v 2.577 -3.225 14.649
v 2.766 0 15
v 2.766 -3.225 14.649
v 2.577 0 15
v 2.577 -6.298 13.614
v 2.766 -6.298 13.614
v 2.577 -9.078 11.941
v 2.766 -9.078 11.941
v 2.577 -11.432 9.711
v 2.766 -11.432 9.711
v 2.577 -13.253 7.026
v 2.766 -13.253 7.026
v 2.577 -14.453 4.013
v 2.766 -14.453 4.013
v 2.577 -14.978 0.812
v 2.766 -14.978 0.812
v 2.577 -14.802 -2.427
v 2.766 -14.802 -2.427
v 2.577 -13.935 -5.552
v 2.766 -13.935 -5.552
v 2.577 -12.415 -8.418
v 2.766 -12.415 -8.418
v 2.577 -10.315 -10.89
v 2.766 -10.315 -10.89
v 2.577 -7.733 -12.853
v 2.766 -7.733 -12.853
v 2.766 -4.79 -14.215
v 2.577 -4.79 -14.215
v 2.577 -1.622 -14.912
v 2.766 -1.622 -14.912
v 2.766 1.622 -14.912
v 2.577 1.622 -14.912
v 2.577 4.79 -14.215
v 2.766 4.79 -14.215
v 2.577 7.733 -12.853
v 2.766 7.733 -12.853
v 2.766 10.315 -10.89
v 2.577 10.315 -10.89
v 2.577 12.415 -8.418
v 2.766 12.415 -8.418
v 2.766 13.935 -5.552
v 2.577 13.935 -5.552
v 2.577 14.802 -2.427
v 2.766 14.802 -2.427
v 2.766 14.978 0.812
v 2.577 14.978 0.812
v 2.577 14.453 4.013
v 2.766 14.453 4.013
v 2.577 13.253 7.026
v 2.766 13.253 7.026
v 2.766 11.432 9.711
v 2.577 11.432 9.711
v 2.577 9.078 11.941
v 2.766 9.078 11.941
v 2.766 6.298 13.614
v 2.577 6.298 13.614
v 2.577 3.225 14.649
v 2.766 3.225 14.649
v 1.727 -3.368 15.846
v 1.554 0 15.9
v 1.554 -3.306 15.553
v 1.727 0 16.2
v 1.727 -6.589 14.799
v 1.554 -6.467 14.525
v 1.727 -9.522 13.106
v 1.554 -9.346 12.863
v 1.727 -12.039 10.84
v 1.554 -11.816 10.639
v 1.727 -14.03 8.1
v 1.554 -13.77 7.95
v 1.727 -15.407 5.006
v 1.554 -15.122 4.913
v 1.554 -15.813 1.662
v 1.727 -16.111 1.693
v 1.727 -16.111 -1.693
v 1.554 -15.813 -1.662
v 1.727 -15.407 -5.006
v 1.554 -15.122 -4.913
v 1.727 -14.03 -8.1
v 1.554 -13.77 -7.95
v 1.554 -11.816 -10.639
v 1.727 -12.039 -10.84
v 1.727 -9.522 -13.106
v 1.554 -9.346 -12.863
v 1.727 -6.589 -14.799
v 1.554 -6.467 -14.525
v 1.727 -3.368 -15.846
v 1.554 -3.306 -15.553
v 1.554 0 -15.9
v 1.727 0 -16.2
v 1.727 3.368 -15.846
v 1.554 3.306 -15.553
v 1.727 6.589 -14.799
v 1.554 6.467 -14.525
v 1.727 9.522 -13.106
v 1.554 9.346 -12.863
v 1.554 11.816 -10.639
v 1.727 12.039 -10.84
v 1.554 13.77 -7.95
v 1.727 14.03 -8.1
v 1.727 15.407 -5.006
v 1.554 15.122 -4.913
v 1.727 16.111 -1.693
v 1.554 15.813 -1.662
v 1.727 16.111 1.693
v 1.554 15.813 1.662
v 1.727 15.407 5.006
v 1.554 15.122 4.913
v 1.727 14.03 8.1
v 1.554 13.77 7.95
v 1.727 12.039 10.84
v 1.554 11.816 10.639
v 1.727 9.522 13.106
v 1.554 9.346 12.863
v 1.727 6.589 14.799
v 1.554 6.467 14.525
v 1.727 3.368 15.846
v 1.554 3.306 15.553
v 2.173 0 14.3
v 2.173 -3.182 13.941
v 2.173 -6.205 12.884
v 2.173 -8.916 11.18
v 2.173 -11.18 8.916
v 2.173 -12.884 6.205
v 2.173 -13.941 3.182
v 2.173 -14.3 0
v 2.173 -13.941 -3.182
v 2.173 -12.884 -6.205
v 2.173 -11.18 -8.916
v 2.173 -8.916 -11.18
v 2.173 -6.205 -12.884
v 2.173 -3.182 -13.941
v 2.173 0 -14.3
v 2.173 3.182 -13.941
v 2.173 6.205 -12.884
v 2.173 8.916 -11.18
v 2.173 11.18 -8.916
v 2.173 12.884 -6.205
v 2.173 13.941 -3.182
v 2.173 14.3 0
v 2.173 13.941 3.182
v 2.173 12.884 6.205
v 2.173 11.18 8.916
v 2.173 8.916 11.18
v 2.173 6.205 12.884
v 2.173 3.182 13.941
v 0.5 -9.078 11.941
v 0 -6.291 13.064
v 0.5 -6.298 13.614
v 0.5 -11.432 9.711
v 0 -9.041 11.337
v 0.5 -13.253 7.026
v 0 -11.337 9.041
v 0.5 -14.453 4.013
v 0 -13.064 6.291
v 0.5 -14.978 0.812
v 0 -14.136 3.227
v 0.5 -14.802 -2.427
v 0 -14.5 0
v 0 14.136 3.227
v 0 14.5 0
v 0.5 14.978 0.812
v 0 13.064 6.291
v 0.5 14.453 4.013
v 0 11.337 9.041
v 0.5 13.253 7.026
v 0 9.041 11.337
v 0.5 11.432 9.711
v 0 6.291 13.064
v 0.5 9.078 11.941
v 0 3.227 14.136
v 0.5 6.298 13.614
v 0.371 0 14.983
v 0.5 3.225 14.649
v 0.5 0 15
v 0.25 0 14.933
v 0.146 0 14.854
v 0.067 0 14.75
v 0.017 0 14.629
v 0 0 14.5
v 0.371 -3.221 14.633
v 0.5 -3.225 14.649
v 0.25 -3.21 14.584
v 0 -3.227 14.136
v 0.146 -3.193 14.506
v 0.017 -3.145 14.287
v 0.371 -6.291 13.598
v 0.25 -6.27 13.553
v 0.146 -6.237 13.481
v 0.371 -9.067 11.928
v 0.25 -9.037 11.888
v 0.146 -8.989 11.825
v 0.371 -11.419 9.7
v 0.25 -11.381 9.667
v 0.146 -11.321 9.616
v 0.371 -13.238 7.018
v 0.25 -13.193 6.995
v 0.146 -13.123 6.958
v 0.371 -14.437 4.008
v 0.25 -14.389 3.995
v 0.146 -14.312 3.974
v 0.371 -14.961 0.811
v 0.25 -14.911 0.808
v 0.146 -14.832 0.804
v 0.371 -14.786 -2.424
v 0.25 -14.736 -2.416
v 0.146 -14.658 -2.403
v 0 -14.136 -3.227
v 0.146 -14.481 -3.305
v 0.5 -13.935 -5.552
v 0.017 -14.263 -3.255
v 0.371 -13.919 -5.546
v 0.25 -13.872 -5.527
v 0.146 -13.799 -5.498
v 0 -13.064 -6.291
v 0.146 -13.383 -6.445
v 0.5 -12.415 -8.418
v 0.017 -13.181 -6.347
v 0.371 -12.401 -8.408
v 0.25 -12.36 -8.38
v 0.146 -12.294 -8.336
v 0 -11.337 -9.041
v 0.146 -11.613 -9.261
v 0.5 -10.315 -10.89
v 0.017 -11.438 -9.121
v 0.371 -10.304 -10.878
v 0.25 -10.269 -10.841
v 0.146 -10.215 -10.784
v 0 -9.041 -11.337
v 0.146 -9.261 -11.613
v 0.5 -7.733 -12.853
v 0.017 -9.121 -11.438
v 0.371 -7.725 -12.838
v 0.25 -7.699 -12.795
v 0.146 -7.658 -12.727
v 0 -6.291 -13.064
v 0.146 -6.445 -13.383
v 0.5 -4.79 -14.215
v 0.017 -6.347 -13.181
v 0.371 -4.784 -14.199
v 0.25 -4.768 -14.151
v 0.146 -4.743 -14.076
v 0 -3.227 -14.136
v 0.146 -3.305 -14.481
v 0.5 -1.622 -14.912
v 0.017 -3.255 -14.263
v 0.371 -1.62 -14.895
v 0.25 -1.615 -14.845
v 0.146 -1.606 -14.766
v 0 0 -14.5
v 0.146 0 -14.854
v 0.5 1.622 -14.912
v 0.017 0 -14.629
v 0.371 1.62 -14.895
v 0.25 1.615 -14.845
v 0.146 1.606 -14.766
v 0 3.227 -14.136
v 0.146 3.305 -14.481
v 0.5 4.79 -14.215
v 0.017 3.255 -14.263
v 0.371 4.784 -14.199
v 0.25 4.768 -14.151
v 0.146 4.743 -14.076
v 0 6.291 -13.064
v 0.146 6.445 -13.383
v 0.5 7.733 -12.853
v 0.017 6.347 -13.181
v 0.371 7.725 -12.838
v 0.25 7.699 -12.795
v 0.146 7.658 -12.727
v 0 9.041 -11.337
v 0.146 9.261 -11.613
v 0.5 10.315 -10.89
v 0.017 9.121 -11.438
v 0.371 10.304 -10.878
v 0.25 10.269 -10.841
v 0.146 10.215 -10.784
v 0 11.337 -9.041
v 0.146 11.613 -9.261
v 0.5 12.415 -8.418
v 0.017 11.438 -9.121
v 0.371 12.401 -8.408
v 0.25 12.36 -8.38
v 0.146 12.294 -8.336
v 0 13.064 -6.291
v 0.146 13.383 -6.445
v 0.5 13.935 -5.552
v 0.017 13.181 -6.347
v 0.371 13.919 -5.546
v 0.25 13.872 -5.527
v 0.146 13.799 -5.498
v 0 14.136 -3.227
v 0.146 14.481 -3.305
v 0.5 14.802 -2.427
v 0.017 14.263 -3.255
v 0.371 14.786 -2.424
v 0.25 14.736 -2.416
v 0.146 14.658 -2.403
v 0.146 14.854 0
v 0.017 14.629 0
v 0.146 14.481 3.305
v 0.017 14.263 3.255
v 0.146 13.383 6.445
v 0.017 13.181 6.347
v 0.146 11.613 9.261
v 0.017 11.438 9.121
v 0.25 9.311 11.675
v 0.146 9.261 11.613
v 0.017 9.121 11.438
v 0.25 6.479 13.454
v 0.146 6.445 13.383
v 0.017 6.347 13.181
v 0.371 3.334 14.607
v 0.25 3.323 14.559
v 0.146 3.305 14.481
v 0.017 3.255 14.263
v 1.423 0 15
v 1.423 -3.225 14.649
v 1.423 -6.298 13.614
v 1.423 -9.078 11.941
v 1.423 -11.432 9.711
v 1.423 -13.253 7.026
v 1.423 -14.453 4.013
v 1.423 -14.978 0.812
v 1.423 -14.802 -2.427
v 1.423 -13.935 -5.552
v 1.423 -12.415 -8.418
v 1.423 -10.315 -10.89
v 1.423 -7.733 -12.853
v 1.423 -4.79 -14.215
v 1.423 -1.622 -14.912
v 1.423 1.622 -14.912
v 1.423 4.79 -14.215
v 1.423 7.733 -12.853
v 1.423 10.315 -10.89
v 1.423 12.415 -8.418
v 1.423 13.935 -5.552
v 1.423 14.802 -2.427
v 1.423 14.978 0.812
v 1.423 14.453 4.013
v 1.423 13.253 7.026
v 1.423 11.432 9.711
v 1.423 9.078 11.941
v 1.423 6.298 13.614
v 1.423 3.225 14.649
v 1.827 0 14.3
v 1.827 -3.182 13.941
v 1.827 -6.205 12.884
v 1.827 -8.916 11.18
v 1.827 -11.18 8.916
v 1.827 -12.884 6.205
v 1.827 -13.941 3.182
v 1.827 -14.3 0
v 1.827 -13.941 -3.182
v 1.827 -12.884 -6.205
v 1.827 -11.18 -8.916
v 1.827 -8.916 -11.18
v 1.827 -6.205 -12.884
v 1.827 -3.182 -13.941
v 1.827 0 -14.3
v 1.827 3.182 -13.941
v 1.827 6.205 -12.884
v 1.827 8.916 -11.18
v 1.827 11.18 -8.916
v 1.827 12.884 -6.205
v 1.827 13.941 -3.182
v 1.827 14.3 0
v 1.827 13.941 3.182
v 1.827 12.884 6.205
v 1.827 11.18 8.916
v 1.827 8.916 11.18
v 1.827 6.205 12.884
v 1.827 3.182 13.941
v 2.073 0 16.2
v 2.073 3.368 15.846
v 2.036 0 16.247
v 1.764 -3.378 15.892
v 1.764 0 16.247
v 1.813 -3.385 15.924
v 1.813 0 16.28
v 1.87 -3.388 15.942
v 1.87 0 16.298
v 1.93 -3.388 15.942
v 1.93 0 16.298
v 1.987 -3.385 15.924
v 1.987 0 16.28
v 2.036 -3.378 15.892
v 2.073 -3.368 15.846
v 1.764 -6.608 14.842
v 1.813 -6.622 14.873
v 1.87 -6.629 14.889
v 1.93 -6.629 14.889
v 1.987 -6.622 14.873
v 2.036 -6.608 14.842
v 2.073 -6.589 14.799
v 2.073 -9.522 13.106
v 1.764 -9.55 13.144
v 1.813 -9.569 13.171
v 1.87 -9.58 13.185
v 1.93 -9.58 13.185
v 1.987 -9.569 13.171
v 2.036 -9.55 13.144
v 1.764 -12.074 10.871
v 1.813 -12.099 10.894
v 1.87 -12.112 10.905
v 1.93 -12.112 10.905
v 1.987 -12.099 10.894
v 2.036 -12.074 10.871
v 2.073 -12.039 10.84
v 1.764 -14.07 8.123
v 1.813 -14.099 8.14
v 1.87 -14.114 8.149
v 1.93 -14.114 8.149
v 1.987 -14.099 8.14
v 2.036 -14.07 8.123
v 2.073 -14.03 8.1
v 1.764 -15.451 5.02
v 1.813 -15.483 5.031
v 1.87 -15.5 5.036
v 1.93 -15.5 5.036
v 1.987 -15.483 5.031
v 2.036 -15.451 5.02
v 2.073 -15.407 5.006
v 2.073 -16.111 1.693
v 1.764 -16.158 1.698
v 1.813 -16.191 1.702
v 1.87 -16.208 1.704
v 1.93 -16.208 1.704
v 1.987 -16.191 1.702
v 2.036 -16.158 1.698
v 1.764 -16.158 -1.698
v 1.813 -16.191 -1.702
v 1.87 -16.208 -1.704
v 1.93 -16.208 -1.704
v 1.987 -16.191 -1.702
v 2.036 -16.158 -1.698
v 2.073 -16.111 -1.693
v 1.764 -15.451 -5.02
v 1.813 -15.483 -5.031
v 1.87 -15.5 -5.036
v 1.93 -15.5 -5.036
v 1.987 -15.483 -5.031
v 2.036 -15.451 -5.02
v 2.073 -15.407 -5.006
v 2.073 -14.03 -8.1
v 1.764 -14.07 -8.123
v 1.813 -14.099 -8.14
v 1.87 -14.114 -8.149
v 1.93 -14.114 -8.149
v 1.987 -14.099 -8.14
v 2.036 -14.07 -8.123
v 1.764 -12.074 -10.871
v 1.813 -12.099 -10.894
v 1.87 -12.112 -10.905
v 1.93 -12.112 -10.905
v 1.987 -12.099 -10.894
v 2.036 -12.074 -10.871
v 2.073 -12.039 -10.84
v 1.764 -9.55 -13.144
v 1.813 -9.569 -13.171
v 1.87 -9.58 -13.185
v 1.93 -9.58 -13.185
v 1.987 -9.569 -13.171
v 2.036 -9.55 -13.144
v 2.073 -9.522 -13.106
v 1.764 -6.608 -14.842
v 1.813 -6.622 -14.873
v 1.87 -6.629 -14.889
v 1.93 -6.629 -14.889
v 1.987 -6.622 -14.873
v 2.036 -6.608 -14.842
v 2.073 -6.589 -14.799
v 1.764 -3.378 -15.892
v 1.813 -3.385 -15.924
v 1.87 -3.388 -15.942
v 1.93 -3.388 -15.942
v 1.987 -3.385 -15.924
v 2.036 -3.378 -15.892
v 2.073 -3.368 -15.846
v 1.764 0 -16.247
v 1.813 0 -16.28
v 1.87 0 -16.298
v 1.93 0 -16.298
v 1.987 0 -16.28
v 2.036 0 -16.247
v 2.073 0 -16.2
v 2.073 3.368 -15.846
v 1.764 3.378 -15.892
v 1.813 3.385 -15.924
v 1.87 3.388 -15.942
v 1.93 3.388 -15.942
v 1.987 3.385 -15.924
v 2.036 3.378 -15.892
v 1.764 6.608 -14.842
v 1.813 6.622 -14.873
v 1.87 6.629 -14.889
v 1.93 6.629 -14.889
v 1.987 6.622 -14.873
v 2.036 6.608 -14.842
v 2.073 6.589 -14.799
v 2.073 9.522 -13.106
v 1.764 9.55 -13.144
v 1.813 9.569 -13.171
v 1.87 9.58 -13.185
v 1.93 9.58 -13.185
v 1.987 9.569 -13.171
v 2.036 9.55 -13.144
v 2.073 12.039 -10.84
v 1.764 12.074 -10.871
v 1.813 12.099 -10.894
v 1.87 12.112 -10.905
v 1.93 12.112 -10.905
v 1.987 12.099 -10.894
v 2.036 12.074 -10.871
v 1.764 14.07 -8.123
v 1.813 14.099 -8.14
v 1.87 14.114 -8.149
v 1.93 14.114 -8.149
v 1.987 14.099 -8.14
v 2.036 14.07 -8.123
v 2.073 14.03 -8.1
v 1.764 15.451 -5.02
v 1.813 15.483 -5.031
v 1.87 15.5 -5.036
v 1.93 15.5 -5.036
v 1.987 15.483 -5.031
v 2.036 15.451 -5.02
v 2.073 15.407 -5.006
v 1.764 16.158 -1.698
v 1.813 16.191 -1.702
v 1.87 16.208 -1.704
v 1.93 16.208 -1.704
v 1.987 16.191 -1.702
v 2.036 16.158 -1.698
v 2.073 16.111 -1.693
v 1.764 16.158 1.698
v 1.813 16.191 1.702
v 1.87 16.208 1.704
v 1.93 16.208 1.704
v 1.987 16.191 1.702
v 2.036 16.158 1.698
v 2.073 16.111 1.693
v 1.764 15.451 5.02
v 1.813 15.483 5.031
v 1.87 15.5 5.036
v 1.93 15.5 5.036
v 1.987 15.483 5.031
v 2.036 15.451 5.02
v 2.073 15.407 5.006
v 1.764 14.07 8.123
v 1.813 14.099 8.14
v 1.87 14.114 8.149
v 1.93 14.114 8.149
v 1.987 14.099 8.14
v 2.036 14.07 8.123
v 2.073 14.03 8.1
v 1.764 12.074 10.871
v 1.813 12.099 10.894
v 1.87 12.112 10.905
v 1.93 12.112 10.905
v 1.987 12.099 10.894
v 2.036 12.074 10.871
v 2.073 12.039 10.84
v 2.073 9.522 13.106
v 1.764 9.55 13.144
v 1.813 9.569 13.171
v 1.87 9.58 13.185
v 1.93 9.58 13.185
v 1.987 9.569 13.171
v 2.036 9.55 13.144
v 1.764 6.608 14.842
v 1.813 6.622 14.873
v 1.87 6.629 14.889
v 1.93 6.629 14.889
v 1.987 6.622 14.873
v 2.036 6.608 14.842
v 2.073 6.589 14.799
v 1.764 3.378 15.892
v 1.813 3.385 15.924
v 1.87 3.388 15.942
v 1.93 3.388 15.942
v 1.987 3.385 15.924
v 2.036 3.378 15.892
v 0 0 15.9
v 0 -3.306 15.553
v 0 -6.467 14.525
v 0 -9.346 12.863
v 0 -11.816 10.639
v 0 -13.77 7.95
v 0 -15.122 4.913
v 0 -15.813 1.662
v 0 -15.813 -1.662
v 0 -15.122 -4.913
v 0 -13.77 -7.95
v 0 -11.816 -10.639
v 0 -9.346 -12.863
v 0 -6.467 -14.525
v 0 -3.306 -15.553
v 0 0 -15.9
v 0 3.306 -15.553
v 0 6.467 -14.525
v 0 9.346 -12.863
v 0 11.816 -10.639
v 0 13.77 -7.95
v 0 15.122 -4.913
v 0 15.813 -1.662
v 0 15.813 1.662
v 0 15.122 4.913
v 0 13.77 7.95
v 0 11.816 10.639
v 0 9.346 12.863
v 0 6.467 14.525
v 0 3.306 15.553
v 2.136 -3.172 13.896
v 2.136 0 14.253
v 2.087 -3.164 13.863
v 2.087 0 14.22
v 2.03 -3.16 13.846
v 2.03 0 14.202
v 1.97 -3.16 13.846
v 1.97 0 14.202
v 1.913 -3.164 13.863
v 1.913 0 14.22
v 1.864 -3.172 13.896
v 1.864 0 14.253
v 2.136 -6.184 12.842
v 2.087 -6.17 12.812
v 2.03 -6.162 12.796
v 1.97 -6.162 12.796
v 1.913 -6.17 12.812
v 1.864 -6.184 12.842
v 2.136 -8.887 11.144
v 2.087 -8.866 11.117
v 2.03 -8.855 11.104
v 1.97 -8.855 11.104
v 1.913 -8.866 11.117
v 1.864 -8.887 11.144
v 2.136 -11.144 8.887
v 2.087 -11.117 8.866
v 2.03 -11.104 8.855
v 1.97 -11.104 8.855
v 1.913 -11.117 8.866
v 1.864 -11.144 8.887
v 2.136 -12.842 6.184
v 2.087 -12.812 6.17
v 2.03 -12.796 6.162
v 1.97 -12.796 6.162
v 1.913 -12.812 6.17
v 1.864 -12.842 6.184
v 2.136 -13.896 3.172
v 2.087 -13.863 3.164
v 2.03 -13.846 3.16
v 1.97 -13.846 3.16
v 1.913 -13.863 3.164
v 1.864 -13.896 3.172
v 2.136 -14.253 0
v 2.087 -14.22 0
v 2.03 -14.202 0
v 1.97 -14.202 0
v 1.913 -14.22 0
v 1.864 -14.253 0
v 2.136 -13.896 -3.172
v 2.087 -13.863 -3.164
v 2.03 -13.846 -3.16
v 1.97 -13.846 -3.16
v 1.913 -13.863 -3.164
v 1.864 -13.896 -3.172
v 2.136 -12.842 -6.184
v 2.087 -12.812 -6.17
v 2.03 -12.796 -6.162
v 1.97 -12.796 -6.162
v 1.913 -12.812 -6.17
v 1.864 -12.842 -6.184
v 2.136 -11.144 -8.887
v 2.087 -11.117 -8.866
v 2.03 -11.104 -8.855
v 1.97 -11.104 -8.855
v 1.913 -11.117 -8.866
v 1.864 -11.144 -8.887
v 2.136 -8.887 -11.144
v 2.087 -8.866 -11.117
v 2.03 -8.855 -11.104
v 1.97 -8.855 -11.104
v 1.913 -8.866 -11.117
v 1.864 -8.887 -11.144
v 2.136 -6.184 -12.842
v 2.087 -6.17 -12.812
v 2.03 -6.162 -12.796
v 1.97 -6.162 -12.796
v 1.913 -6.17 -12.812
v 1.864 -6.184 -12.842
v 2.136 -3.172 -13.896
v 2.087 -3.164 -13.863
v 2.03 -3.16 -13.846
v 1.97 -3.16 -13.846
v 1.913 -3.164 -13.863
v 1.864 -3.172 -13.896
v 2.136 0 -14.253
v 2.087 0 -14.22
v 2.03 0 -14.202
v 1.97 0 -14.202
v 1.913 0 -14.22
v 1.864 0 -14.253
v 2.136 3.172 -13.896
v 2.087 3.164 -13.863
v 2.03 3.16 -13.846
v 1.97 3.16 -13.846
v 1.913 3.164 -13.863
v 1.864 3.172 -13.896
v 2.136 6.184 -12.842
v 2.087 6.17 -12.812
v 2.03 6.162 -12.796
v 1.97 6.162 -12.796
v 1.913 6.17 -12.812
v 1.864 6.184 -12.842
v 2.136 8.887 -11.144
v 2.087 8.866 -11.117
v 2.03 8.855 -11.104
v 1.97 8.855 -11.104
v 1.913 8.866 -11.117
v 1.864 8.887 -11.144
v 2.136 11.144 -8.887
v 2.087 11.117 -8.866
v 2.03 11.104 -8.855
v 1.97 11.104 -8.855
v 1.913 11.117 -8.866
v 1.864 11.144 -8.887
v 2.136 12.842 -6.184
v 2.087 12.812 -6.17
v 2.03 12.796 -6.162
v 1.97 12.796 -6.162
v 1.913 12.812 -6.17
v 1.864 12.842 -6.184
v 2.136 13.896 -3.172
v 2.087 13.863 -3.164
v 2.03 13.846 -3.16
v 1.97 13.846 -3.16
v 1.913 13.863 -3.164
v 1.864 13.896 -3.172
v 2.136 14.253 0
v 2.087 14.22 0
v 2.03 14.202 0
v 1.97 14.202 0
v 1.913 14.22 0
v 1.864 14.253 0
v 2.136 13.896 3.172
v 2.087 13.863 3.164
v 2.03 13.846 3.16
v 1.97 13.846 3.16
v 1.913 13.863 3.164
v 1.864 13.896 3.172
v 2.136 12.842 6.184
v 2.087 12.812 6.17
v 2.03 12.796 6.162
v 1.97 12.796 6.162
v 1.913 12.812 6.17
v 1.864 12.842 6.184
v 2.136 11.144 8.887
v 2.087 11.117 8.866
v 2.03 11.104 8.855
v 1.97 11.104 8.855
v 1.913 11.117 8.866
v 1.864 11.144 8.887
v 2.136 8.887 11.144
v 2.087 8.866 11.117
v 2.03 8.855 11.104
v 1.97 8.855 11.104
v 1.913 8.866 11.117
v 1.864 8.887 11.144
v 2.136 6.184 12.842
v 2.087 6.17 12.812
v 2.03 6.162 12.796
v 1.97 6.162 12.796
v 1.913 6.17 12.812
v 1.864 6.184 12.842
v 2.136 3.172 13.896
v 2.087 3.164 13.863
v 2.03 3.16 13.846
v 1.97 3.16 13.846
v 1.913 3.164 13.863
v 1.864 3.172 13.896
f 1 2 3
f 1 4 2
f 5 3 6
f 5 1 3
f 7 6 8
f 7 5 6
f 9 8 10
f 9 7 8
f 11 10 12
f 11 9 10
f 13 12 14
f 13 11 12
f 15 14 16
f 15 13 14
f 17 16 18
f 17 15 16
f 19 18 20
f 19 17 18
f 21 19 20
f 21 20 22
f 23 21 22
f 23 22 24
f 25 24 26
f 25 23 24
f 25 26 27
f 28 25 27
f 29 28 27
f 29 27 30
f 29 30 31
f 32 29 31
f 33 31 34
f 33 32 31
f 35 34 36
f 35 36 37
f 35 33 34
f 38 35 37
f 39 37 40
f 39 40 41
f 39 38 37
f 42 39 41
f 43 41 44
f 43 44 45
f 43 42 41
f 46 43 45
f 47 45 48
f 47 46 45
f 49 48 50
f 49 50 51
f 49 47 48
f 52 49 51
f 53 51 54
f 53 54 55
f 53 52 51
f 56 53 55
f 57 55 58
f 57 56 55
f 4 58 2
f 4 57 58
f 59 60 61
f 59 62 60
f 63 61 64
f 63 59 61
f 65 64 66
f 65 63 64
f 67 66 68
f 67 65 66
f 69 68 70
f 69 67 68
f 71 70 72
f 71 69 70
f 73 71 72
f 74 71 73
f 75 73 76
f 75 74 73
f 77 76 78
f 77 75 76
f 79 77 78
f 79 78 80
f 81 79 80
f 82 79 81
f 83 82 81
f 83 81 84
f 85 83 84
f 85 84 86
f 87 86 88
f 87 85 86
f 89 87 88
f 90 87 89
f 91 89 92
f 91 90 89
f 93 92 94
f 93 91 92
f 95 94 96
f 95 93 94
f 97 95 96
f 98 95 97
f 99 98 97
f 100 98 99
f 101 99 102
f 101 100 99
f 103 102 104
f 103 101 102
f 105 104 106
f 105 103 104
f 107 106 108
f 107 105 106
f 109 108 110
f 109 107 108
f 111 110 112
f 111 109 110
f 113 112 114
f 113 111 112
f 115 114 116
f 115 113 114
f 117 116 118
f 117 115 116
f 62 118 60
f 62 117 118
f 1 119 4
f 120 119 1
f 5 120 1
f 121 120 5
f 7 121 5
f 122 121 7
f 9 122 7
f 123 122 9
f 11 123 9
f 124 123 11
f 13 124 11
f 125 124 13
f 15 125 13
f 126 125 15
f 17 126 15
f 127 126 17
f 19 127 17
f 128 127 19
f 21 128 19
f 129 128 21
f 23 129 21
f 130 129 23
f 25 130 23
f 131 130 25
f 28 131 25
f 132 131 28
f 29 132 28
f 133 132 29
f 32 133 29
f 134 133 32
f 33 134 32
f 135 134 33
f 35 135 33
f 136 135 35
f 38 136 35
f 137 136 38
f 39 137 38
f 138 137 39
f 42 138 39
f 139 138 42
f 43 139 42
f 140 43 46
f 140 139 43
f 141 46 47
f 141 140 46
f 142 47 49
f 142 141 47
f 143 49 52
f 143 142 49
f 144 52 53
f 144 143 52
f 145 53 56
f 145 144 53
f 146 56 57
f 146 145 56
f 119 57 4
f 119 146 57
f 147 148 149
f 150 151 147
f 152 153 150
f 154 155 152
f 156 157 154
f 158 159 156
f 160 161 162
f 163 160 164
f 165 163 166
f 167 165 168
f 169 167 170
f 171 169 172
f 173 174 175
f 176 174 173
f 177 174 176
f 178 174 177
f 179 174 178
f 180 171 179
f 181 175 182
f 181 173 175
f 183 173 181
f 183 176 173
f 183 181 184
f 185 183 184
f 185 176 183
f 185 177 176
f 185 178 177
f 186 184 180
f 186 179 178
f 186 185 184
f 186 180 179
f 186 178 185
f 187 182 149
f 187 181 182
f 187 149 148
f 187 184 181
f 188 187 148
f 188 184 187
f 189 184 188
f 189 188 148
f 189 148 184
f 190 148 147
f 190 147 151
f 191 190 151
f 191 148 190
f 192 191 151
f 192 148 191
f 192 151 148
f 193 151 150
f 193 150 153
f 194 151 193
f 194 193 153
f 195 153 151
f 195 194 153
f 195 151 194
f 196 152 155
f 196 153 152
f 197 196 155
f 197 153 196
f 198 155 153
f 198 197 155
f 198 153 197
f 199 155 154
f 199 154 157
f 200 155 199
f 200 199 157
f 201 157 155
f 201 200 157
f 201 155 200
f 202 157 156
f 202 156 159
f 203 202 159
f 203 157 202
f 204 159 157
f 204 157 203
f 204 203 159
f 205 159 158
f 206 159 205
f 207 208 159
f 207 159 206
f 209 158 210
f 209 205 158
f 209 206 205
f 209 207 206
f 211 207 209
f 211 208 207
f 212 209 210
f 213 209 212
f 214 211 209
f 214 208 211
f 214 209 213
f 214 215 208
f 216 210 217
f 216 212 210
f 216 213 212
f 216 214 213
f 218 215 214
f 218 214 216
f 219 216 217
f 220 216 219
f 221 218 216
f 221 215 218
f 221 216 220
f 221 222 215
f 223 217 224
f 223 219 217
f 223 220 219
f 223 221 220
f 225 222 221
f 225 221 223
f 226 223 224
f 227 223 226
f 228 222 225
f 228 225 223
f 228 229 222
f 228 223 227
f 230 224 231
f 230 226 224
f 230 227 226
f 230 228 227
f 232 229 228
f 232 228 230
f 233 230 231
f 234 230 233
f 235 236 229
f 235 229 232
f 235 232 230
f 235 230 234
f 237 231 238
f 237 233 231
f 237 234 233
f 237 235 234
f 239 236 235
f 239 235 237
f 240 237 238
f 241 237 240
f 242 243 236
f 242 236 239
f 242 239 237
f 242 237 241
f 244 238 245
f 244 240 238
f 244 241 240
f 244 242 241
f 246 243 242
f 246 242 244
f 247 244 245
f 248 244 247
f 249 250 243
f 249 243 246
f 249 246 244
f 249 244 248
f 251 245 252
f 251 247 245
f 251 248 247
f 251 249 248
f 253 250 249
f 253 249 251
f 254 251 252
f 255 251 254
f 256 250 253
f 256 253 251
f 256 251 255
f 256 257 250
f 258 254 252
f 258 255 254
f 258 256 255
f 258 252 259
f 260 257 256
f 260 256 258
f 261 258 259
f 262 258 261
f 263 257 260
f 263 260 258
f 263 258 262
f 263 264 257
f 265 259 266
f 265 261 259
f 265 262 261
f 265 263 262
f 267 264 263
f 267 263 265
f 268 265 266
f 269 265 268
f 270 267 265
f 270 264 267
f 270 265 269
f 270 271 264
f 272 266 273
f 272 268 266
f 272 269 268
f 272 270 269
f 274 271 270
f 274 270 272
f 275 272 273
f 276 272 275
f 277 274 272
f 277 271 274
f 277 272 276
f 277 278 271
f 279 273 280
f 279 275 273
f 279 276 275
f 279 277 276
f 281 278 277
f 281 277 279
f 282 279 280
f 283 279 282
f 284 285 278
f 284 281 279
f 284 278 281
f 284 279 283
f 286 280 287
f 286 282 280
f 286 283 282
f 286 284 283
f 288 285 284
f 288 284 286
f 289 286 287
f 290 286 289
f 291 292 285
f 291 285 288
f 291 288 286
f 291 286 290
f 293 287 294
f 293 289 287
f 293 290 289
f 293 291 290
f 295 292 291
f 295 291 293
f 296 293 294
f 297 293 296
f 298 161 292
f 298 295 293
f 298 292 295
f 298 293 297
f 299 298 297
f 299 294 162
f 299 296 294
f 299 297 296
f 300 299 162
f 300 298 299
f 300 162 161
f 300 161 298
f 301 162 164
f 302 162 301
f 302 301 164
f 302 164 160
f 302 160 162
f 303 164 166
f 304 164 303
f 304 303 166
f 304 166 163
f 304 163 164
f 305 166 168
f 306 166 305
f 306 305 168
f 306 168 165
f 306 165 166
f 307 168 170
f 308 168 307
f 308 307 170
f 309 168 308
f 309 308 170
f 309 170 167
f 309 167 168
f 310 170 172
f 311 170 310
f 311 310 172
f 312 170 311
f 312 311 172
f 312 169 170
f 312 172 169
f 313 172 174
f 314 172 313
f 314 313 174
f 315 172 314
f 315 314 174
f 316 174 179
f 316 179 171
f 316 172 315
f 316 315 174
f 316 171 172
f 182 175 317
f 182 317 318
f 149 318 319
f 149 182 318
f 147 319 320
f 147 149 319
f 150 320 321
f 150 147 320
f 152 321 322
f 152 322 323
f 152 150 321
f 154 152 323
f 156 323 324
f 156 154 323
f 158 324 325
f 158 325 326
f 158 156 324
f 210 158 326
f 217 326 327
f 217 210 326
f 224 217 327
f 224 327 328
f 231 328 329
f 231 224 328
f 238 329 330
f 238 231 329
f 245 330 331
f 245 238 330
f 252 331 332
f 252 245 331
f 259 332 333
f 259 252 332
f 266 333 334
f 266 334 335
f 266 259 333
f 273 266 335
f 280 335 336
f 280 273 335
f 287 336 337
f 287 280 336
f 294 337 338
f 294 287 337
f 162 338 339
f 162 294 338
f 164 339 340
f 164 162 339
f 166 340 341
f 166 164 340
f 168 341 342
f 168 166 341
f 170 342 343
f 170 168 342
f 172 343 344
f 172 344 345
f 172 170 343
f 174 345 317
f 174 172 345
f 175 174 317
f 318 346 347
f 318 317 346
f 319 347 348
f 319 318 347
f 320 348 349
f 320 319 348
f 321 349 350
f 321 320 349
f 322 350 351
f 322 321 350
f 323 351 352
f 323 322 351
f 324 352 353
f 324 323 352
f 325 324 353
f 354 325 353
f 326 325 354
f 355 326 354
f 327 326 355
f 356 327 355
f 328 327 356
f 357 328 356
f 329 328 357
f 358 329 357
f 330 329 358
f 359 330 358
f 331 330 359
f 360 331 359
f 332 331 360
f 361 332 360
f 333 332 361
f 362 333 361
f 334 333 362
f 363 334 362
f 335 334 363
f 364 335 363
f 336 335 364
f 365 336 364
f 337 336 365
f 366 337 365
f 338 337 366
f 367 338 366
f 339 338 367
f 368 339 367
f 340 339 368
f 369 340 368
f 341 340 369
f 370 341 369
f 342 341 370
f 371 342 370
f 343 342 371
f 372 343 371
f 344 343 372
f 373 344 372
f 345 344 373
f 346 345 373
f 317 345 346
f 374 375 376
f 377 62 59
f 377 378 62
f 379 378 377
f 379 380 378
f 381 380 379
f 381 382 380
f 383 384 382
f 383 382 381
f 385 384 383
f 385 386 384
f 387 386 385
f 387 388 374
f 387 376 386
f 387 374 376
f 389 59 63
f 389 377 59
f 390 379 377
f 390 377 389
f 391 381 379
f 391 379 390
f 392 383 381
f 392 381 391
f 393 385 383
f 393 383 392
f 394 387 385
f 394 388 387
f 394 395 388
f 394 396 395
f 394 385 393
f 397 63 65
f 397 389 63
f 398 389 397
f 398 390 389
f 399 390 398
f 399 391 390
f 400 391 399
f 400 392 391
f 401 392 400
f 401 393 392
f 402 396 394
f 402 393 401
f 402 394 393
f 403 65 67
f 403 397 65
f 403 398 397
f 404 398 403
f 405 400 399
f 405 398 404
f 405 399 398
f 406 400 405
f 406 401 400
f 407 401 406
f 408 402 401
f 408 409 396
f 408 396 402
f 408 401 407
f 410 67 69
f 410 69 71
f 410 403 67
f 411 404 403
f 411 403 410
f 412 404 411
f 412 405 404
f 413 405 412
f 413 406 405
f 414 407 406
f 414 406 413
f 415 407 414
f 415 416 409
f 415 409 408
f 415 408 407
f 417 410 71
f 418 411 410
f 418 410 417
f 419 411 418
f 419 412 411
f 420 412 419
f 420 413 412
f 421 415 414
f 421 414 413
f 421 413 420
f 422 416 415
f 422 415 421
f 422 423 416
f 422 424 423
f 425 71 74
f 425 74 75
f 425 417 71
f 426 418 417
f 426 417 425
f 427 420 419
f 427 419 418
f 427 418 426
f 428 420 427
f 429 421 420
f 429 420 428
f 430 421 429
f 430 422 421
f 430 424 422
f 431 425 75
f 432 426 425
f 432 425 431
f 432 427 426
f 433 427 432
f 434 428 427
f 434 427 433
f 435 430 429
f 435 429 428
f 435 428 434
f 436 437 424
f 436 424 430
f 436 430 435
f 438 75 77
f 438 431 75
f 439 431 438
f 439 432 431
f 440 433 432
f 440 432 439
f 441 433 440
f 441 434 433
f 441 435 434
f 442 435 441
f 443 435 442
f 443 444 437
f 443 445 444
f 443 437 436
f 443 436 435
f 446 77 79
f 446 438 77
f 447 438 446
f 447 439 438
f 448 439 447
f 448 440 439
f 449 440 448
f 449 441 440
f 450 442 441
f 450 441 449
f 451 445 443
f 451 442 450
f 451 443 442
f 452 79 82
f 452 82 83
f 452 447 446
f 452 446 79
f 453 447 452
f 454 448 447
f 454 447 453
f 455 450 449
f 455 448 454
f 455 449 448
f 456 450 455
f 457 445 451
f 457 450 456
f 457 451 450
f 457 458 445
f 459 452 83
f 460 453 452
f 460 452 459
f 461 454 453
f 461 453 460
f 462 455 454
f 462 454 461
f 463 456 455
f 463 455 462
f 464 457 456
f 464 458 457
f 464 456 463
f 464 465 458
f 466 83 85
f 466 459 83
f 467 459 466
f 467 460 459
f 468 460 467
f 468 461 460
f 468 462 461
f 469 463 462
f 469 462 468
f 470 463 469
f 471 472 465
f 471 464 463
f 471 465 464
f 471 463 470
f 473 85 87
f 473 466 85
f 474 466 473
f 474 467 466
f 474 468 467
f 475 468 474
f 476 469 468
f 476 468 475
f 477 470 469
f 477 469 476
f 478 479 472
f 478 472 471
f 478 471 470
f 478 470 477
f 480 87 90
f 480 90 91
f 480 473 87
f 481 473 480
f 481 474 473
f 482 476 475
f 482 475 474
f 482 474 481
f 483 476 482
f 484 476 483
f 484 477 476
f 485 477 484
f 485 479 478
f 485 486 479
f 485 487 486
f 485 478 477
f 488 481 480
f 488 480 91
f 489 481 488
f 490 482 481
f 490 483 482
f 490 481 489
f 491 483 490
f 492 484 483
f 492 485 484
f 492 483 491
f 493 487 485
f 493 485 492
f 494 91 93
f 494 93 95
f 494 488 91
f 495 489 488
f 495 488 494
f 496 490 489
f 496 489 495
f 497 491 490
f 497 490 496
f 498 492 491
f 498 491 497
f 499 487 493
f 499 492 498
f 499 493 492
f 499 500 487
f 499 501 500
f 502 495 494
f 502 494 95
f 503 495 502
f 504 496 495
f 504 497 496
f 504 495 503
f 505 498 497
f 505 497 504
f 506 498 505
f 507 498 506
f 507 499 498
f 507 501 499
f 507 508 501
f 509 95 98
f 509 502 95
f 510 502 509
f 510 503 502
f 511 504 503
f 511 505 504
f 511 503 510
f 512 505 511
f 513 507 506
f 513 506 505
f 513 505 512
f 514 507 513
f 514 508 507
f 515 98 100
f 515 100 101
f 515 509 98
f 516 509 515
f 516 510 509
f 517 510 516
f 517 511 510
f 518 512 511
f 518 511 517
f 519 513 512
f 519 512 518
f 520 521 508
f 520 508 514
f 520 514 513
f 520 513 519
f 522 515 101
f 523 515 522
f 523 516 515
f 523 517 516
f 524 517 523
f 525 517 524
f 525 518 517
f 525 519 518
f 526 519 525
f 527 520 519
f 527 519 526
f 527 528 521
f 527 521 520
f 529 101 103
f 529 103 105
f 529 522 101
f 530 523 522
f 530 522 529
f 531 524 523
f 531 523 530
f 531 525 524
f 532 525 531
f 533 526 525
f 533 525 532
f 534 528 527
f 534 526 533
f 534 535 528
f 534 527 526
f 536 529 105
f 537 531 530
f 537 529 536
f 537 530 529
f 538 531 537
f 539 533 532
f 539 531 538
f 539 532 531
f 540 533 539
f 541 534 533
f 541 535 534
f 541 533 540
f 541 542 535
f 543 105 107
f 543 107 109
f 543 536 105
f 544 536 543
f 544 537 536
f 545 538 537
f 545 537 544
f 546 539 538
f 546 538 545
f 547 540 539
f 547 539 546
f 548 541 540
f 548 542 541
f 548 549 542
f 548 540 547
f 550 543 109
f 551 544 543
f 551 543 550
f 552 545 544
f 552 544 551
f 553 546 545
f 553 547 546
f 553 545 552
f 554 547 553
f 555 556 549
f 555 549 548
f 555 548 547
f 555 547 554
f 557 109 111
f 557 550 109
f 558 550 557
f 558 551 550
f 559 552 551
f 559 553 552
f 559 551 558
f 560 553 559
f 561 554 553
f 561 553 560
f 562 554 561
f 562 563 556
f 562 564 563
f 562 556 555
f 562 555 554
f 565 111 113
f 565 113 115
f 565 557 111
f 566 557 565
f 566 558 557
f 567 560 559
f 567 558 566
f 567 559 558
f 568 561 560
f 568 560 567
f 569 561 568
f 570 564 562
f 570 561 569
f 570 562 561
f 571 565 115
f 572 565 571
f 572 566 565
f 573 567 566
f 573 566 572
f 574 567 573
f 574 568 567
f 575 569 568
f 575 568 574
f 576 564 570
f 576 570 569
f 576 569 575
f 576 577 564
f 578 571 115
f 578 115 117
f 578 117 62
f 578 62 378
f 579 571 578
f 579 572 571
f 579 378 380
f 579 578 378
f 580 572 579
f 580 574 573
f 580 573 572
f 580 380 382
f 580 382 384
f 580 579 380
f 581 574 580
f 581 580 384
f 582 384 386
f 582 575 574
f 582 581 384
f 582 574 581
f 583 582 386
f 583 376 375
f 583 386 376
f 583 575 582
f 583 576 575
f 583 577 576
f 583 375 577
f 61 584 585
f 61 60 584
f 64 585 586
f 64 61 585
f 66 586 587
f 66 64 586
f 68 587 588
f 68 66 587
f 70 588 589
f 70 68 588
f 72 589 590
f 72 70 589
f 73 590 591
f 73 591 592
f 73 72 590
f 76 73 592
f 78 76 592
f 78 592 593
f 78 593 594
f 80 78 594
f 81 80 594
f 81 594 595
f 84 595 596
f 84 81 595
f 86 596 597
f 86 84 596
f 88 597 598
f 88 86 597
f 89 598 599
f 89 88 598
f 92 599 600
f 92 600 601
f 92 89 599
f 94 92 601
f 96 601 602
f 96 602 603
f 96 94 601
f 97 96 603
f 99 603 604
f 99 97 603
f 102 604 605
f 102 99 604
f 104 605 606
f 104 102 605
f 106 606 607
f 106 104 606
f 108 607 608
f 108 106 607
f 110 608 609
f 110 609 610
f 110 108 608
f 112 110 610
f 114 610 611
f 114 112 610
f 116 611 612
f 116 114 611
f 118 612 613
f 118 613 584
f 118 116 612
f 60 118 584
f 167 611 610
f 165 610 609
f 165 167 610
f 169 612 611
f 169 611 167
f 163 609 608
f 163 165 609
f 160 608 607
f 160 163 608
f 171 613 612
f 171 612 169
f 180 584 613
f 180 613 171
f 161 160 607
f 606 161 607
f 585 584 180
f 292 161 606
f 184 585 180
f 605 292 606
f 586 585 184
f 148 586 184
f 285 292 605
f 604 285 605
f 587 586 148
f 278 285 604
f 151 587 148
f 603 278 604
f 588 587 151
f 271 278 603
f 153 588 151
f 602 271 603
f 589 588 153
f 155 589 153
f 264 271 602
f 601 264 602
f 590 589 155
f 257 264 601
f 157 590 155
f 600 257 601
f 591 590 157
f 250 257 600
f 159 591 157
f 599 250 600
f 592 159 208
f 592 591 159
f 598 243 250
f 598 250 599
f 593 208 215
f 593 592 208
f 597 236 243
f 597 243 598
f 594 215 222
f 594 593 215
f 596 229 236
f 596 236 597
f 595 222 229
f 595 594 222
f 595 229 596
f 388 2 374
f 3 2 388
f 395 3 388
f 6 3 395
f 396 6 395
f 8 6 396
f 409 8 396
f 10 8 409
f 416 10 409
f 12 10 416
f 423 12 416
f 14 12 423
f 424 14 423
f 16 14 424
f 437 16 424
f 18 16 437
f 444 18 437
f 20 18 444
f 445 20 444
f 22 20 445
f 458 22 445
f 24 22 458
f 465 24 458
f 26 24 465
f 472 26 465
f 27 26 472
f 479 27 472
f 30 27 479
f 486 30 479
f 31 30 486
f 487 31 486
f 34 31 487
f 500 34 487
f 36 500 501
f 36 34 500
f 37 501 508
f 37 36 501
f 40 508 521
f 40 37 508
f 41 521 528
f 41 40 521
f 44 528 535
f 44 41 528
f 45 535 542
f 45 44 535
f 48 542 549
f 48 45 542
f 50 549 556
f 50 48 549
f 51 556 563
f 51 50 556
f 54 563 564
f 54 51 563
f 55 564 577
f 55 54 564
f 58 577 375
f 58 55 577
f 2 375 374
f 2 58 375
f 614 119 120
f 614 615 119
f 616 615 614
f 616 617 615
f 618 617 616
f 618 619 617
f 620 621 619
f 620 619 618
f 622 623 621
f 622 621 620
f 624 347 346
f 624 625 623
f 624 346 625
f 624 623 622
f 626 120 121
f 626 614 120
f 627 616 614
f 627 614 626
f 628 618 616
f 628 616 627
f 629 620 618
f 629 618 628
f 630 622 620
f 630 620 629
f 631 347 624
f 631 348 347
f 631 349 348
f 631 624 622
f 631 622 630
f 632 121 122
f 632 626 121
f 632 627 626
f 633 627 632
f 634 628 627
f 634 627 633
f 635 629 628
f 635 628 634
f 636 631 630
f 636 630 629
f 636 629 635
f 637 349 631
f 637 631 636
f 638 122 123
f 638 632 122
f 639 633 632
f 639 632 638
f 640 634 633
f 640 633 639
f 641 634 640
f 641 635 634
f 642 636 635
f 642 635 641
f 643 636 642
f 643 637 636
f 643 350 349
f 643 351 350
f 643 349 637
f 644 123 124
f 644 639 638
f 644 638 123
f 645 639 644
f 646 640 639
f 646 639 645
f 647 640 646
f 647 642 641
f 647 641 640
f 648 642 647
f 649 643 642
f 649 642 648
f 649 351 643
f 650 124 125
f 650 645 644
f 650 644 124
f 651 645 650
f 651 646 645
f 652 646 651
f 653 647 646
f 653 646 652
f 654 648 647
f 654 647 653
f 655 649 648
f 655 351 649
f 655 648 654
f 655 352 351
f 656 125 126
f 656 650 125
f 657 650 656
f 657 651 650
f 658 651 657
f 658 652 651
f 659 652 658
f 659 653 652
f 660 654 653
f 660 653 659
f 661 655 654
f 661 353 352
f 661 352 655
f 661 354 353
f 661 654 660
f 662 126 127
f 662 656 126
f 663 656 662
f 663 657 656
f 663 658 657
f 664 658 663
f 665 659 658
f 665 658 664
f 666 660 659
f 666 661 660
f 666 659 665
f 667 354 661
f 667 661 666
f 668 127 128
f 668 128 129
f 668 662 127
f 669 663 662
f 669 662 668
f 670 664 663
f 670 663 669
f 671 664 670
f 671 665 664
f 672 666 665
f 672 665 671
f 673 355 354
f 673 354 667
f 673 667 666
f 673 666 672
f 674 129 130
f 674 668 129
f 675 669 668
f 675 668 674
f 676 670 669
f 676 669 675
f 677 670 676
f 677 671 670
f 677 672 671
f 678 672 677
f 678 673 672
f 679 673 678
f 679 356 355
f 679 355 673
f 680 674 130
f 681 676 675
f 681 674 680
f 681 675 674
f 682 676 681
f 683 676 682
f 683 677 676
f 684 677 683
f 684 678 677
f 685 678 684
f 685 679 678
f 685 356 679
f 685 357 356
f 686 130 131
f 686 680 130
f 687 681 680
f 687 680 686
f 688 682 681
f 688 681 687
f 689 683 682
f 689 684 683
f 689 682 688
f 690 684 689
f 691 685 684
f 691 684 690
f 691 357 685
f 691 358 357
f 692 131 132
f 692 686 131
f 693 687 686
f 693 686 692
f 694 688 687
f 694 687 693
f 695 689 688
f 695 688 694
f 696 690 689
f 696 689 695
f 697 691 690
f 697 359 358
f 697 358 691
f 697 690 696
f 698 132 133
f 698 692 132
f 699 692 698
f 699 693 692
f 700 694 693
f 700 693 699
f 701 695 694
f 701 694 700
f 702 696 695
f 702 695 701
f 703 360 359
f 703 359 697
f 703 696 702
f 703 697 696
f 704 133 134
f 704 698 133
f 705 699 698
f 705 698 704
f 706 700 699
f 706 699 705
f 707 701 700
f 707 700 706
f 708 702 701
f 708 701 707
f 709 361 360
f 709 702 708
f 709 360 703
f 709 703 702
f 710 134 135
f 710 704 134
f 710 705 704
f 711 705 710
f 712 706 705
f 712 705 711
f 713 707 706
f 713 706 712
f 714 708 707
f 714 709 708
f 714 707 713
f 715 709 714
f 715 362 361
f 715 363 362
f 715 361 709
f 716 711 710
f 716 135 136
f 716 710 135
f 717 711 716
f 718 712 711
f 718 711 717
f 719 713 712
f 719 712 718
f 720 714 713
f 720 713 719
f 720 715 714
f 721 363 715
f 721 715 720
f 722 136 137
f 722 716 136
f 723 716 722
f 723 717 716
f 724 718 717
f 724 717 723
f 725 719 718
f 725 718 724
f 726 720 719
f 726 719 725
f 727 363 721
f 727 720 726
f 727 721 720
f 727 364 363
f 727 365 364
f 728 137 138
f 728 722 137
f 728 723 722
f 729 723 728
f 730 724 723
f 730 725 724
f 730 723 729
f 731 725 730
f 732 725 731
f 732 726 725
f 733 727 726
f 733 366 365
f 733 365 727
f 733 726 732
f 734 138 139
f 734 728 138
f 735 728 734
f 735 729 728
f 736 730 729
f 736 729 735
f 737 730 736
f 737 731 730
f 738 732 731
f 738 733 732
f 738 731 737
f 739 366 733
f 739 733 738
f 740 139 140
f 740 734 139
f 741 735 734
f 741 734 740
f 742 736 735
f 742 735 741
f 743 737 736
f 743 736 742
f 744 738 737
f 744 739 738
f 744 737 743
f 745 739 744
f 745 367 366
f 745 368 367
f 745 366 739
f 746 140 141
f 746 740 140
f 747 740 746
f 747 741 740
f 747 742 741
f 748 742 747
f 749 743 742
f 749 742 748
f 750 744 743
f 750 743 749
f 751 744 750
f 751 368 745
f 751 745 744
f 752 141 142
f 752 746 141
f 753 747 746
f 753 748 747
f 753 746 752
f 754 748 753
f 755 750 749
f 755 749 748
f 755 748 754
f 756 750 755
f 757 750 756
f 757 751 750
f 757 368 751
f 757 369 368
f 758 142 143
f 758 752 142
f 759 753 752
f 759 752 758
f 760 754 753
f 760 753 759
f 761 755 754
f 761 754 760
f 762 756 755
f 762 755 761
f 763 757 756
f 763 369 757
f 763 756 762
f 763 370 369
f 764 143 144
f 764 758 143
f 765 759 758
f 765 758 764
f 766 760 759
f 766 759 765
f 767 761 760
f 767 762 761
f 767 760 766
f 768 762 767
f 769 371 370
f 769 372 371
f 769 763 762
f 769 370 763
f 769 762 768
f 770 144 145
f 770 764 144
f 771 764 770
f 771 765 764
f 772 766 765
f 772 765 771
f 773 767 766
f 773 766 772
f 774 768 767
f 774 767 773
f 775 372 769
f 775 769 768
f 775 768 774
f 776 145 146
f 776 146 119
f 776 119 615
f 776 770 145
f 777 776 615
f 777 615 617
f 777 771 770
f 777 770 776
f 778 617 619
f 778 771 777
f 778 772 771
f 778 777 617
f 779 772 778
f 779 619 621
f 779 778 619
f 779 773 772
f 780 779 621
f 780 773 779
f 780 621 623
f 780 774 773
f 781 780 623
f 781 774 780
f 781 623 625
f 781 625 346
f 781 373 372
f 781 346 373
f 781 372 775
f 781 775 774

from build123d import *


with BuildPart() as part:
    # Эскиз1 → Повернуть1 (revolve)
    with BuildSketch(Plane.XY, mode=Mode.PRIVATE) as revolve_1_sk:
        with BuildLine():
            Line((0, 15.9), (1.553589838, 15.9))
            Line((1.553589838, 15.9), (1.726794919, 16.2))
            ThreePointArc((1.726794919, 16.2), (1.9, 16.3), (2.073205081, 16.2))
            Line((2.073205081, 16.2), (2.766025404, 15))
            Line((2.766025404, 15), (2.577350269, 15))
            Line((2.577350269, 15), (2.173205081, 14.3))
            ThreePointArc((2.173205081, 14.3), (2, 14.2), (1.826794919, 14.3))
            Line((1.826794919, 14.3), (1.422649731, 15))
            Line((1.422649731, 15), (0, 15))
            Line((0, 15), (0, 15.9))
        make_face()
    revolve(revolve_1_sk.sketch.rotate(Axis((0, 0, 0), (1, 0, 0)), 90), axis=Axis((0, 0, 0), (1, 0, 0)))

    # Эскиз2 → Повернуть2 (revolve)
    with BuildSketch(Plane.XY, mode=Mode.PRIVATE) as revolve_2_sk:
        with BuildLine():
            Line((0, 14.5), (0, 15))
            Line((0, 15), (0.5, 15))
            ThreePointArc((0.5, 15), (0.146446609, 14.853553391), (0, 14.5))
        make_face()
    revolve(revolve_2_sk.sketch.rotate(Axis((0, 0, 0), (1, 0, 0)), 90), axis=Axis((0, 0, 0), (1, 0, 0)))


solid = part.part
